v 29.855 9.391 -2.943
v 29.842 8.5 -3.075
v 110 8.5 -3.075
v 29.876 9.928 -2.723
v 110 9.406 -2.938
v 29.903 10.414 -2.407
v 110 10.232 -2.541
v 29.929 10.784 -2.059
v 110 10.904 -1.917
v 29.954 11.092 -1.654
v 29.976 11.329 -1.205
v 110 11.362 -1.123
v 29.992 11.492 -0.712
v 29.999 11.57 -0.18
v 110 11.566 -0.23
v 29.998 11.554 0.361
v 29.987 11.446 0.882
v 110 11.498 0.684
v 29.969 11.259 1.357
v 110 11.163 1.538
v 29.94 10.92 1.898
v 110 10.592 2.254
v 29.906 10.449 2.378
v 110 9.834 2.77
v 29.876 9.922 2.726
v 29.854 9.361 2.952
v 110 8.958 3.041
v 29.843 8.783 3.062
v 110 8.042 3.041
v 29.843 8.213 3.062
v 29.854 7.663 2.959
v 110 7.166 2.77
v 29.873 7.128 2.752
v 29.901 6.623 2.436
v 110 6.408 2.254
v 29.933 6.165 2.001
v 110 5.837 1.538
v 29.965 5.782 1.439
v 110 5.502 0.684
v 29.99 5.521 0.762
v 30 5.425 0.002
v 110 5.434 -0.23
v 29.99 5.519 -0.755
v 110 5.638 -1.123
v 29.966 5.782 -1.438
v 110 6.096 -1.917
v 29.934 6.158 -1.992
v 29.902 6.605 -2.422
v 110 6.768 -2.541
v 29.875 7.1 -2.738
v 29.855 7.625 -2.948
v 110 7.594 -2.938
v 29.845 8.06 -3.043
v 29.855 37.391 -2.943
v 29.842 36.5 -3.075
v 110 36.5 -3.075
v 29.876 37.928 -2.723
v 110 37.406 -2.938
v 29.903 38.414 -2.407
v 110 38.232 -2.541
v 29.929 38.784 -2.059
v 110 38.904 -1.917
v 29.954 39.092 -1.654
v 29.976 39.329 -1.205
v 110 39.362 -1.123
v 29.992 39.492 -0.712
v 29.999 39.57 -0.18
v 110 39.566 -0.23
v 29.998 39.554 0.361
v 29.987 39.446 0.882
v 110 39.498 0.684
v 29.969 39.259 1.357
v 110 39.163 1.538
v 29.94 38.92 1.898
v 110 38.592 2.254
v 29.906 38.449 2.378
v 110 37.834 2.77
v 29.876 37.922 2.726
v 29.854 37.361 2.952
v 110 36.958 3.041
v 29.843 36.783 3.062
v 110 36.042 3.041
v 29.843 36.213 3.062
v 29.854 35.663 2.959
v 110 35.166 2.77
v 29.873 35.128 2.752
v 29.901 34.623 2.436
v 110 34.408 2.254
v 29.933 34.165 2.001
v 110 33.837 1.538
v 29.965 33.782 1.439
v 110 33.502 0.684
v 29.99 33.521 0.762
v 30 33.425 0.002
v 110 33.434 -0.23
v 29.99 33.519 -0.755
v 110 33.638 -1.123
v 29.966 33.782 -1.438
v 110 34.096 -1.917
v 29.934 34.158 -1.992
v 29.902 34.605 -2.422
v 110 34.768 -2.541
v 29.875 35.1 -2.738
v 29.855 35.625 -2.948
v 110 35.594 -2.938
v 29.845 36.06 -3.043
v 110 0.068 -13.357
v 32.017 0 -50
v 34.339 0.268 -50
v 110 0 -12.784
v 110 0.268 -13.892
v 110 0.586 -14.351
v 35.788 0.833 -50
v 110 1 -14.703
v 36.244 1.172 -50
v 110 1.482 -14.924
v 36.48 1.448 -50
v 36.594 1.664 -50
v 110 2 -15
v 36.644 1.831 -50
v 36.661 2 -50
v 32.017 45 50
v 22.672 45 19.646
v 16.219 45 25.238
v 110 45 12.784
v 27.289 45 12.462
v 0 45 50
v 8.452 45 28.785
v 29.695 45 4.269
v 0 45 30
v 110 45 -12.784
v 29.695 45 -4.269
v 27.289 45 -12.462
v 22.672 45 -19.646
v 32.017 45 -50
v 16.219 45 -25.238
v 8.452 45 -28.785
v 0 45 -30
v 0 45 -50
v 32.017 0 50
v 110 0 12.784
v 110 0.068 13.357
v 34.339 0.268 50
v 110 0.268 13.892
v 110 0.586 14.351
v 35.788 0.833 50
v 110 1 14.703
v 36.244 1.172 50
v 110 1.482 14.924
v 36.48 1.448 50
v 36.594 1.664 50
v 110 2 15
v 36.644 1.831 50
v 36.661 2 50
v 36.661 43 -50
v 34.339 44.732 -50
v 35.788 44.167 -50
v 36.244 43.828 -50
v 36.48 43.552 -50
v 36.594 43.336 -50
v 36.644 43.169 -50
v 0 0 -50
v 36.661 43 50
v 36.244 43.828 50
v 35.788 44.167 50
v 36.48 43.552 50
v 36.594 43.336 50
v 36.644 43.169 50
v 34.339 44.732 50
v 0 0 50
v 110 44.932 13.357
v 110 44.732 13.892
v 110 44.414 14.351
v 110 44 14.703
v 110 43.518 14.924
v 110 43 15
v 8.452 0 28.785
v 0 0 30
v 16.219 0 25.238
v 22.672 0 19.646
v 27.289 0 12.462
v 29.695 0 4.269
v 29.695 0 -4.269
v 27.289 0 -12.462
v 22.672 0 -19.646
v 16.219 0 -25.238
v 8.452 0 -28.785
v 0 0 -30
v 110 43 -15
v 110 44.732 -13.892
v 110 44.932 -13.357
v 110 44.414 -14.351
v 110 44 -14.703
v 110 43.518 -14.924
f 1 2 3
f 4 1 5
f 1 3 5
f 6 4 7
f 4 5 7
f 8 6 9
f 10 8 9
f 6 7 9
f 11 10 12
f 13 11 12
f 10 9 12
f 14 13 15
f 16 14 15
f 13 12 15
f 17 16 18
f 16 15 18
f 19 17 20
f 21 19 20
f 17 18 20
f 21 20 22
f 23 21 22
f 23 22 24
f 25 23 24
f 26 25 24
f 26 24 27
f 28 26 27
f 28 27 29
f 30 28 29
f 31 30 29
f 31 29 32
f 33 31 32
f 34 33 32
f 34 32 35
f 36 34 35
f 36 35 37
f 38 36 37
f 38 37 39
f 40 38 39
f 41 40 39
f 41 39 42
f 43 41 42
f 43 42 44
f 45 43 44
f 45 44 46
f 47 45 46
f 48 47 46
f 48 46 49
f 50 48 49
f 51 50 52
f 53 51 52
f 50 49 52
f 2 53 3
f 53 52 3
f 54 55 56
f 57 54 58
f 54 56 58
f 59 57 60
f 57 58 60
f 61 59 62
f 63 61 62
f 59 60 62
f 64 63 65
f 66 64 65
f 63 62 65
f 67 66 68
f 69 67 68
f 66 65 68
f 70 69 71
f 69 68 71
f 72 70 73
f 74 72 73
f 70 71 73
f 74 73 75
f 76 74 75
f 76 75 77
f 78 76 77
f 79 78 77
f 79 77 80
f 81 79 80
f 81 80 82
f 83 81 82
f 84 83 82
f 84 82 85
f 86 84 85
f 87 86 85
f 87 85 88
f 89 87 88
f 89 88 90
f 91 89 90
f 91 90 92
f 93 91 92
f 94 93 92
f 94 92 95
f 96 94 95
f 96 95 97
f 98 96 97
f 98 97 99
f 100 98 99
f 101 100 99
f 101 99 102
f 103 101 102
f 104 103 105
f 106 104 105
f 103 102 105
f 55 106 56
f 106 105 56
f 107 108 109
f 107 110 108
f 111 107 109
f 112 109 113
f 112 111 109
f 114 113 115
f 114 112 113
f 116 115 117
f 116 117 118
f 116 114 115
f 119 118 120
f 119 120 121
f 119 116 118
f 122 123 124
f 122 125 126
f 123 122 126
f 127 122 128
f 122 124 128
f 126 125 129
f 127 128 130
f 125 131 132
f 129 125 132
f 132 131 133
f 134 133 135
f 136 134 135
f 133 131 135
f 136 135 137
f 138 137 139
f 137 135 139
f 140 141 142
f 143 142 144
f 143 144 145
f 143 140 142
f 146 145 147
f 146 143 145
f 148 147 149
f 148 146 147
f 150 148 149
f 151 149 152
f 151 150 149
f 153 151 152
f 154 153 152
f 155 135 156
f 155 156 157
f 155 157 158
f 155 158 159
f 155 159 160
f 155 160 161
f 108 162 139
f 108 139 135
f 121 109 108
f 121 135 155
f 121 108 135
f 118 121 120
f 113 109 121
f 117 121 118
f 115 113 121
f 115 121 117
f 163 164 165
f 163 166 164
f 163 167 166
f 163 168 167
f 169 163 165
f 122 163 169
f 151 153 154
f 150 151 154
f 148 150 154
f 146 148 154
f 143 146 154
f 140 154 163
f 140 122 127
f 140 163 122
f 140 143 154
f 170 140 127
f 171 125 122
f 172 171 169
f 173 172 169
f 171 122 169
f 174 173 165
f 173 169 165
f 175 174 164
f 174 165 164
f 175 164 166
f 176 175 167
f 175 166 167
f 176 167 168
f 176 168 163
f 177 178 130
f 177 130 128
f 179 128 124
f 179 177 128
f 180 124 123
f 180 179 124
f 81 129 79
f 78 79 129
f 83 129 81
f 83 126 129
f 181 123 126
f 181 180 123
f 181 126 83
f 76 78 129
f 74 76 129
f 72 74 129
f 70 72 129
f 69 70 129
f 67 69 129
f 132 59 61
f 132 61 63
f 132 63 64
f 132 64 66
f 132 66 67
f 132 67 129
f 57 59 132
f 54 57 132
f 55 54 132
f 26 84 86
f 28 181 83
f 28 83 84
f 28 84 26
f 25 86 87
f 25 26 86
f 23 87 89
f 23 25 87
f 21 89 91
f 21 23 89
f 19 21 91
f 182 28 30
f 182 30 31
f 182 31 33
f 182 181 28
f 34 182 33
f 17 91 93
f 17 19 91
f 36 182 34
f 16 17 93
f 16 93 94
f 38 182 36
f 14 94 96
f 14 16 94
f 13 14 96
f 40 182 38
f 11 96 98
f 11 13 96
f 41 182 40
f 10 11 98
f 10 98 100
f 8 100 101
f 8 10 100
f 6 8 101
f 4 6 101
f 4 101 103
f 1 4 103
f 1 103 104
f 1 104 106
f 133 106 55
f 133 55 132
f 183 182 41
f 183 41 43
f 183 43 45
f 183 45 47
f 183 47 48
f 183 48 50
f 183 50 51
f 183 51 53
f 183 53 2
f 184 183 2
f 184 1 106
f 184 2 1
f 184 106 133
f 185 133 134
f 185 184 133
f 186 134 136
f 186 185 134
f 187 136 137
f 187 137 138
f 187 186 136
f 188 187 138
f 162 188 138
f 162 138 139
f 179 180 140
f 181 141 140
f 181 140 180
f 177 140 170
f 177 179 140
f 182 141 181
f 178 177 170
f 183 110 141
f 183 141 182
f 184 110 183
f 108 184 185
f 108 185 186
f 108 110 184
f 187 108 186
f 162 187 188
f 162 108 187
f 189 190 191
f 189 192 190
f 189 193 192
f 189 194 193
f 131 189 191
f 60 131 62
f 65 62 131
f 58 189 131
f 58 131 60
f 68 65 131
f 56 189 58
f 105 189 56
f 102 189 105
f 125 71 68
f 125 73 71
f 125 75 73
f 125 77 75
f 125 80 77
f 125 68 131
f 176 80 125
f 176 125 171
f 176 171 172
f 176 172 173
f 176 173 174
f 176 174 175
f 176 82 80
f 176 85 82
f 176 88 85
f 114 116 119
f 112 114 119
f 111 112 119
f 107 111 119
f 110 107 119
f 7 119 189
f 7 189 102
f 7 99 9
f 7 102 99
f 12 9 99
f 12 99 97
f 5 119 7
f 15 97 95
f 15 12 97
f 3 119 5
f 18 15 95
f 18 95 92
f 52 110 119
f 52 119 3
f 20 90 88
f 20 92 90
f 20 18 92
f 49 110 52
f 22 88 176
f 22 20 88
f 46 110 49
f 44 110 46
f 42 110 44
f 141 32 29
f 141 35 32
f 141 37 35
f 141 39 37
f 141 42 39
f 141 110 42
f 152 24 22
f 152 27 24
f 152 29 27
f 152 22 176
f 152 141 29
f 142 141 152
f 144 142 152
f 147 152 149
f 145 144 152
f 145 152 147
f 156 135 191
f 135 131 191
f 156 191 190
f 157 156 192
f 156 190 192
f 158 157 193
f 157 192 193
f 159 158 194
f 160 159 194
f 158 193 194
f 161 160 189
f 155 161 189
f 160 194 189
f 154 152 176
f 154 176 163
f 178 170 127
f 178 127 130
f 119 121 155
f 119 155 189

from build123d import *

# Parameters (mm, degrees)
SALIENTE_EXTRUIR1_DEPTH = 45
CROQUIS2_R              = 3.075
CORTAR_EXTRUIR1_DEPTH   = 129.937969582
REDONDEO1_R             = 2


with BuildPart() as part:
    # Croquis1 → Saliente-Extruir1 (new body)
    with BuildSketch(Plane(origin=(0, 0, 0), x_dir=(1, 0, 0), z_dir=(0, 1, 0))):
        with BuildLine():
            Line((0, 30), (0, 50))
            Line((0, 50), (36.66060556, 50))
            Line((36.66060556, 50), (110, 15))
            Line((110, 15), (110, -15))
            Line((110, -15), (36.66060556, -50))
            Line((36.66060556, -50), (0, -50))
            Line((0, -50), (0, -30))
            ThreePointArc((0, -30), (30, 0), (0, 30))
        make_face()
    extrude(amount=SALIENTE_EXTRUIR1_DEPTH)

    # Croquis2 → Cortar-Extruir1 (cut, through all)
    with BuildSketch(Plane(origin=(110, 0, 0), x_dir=(0, 0, -1), z_dir=(1, 0, 0))):
        with Locations((0, 36.5)):
            Circle(CROQUIS2_R)
        with Locations((0, 8.5)):
            Circle(CROQUIS2_R)
    extrude(amount=-CORTAR_EXTRUIR1_DEPTH, mode=Mode.SUBTRACT)

    # Redondeo1
    redondeo1_edges = [part.edges().sort_by_distance(p)[0] for p in [
        (73.33030278, 0, 32.5),
        (73.33030278, 45, 32.5),
        (73.33030278, 45, -32.5),
        (73.33030278, 0, -32.5),
    ]]
    fillet(redondeo1_edges, radius=REDONDEO1_R)


solid = part.part
